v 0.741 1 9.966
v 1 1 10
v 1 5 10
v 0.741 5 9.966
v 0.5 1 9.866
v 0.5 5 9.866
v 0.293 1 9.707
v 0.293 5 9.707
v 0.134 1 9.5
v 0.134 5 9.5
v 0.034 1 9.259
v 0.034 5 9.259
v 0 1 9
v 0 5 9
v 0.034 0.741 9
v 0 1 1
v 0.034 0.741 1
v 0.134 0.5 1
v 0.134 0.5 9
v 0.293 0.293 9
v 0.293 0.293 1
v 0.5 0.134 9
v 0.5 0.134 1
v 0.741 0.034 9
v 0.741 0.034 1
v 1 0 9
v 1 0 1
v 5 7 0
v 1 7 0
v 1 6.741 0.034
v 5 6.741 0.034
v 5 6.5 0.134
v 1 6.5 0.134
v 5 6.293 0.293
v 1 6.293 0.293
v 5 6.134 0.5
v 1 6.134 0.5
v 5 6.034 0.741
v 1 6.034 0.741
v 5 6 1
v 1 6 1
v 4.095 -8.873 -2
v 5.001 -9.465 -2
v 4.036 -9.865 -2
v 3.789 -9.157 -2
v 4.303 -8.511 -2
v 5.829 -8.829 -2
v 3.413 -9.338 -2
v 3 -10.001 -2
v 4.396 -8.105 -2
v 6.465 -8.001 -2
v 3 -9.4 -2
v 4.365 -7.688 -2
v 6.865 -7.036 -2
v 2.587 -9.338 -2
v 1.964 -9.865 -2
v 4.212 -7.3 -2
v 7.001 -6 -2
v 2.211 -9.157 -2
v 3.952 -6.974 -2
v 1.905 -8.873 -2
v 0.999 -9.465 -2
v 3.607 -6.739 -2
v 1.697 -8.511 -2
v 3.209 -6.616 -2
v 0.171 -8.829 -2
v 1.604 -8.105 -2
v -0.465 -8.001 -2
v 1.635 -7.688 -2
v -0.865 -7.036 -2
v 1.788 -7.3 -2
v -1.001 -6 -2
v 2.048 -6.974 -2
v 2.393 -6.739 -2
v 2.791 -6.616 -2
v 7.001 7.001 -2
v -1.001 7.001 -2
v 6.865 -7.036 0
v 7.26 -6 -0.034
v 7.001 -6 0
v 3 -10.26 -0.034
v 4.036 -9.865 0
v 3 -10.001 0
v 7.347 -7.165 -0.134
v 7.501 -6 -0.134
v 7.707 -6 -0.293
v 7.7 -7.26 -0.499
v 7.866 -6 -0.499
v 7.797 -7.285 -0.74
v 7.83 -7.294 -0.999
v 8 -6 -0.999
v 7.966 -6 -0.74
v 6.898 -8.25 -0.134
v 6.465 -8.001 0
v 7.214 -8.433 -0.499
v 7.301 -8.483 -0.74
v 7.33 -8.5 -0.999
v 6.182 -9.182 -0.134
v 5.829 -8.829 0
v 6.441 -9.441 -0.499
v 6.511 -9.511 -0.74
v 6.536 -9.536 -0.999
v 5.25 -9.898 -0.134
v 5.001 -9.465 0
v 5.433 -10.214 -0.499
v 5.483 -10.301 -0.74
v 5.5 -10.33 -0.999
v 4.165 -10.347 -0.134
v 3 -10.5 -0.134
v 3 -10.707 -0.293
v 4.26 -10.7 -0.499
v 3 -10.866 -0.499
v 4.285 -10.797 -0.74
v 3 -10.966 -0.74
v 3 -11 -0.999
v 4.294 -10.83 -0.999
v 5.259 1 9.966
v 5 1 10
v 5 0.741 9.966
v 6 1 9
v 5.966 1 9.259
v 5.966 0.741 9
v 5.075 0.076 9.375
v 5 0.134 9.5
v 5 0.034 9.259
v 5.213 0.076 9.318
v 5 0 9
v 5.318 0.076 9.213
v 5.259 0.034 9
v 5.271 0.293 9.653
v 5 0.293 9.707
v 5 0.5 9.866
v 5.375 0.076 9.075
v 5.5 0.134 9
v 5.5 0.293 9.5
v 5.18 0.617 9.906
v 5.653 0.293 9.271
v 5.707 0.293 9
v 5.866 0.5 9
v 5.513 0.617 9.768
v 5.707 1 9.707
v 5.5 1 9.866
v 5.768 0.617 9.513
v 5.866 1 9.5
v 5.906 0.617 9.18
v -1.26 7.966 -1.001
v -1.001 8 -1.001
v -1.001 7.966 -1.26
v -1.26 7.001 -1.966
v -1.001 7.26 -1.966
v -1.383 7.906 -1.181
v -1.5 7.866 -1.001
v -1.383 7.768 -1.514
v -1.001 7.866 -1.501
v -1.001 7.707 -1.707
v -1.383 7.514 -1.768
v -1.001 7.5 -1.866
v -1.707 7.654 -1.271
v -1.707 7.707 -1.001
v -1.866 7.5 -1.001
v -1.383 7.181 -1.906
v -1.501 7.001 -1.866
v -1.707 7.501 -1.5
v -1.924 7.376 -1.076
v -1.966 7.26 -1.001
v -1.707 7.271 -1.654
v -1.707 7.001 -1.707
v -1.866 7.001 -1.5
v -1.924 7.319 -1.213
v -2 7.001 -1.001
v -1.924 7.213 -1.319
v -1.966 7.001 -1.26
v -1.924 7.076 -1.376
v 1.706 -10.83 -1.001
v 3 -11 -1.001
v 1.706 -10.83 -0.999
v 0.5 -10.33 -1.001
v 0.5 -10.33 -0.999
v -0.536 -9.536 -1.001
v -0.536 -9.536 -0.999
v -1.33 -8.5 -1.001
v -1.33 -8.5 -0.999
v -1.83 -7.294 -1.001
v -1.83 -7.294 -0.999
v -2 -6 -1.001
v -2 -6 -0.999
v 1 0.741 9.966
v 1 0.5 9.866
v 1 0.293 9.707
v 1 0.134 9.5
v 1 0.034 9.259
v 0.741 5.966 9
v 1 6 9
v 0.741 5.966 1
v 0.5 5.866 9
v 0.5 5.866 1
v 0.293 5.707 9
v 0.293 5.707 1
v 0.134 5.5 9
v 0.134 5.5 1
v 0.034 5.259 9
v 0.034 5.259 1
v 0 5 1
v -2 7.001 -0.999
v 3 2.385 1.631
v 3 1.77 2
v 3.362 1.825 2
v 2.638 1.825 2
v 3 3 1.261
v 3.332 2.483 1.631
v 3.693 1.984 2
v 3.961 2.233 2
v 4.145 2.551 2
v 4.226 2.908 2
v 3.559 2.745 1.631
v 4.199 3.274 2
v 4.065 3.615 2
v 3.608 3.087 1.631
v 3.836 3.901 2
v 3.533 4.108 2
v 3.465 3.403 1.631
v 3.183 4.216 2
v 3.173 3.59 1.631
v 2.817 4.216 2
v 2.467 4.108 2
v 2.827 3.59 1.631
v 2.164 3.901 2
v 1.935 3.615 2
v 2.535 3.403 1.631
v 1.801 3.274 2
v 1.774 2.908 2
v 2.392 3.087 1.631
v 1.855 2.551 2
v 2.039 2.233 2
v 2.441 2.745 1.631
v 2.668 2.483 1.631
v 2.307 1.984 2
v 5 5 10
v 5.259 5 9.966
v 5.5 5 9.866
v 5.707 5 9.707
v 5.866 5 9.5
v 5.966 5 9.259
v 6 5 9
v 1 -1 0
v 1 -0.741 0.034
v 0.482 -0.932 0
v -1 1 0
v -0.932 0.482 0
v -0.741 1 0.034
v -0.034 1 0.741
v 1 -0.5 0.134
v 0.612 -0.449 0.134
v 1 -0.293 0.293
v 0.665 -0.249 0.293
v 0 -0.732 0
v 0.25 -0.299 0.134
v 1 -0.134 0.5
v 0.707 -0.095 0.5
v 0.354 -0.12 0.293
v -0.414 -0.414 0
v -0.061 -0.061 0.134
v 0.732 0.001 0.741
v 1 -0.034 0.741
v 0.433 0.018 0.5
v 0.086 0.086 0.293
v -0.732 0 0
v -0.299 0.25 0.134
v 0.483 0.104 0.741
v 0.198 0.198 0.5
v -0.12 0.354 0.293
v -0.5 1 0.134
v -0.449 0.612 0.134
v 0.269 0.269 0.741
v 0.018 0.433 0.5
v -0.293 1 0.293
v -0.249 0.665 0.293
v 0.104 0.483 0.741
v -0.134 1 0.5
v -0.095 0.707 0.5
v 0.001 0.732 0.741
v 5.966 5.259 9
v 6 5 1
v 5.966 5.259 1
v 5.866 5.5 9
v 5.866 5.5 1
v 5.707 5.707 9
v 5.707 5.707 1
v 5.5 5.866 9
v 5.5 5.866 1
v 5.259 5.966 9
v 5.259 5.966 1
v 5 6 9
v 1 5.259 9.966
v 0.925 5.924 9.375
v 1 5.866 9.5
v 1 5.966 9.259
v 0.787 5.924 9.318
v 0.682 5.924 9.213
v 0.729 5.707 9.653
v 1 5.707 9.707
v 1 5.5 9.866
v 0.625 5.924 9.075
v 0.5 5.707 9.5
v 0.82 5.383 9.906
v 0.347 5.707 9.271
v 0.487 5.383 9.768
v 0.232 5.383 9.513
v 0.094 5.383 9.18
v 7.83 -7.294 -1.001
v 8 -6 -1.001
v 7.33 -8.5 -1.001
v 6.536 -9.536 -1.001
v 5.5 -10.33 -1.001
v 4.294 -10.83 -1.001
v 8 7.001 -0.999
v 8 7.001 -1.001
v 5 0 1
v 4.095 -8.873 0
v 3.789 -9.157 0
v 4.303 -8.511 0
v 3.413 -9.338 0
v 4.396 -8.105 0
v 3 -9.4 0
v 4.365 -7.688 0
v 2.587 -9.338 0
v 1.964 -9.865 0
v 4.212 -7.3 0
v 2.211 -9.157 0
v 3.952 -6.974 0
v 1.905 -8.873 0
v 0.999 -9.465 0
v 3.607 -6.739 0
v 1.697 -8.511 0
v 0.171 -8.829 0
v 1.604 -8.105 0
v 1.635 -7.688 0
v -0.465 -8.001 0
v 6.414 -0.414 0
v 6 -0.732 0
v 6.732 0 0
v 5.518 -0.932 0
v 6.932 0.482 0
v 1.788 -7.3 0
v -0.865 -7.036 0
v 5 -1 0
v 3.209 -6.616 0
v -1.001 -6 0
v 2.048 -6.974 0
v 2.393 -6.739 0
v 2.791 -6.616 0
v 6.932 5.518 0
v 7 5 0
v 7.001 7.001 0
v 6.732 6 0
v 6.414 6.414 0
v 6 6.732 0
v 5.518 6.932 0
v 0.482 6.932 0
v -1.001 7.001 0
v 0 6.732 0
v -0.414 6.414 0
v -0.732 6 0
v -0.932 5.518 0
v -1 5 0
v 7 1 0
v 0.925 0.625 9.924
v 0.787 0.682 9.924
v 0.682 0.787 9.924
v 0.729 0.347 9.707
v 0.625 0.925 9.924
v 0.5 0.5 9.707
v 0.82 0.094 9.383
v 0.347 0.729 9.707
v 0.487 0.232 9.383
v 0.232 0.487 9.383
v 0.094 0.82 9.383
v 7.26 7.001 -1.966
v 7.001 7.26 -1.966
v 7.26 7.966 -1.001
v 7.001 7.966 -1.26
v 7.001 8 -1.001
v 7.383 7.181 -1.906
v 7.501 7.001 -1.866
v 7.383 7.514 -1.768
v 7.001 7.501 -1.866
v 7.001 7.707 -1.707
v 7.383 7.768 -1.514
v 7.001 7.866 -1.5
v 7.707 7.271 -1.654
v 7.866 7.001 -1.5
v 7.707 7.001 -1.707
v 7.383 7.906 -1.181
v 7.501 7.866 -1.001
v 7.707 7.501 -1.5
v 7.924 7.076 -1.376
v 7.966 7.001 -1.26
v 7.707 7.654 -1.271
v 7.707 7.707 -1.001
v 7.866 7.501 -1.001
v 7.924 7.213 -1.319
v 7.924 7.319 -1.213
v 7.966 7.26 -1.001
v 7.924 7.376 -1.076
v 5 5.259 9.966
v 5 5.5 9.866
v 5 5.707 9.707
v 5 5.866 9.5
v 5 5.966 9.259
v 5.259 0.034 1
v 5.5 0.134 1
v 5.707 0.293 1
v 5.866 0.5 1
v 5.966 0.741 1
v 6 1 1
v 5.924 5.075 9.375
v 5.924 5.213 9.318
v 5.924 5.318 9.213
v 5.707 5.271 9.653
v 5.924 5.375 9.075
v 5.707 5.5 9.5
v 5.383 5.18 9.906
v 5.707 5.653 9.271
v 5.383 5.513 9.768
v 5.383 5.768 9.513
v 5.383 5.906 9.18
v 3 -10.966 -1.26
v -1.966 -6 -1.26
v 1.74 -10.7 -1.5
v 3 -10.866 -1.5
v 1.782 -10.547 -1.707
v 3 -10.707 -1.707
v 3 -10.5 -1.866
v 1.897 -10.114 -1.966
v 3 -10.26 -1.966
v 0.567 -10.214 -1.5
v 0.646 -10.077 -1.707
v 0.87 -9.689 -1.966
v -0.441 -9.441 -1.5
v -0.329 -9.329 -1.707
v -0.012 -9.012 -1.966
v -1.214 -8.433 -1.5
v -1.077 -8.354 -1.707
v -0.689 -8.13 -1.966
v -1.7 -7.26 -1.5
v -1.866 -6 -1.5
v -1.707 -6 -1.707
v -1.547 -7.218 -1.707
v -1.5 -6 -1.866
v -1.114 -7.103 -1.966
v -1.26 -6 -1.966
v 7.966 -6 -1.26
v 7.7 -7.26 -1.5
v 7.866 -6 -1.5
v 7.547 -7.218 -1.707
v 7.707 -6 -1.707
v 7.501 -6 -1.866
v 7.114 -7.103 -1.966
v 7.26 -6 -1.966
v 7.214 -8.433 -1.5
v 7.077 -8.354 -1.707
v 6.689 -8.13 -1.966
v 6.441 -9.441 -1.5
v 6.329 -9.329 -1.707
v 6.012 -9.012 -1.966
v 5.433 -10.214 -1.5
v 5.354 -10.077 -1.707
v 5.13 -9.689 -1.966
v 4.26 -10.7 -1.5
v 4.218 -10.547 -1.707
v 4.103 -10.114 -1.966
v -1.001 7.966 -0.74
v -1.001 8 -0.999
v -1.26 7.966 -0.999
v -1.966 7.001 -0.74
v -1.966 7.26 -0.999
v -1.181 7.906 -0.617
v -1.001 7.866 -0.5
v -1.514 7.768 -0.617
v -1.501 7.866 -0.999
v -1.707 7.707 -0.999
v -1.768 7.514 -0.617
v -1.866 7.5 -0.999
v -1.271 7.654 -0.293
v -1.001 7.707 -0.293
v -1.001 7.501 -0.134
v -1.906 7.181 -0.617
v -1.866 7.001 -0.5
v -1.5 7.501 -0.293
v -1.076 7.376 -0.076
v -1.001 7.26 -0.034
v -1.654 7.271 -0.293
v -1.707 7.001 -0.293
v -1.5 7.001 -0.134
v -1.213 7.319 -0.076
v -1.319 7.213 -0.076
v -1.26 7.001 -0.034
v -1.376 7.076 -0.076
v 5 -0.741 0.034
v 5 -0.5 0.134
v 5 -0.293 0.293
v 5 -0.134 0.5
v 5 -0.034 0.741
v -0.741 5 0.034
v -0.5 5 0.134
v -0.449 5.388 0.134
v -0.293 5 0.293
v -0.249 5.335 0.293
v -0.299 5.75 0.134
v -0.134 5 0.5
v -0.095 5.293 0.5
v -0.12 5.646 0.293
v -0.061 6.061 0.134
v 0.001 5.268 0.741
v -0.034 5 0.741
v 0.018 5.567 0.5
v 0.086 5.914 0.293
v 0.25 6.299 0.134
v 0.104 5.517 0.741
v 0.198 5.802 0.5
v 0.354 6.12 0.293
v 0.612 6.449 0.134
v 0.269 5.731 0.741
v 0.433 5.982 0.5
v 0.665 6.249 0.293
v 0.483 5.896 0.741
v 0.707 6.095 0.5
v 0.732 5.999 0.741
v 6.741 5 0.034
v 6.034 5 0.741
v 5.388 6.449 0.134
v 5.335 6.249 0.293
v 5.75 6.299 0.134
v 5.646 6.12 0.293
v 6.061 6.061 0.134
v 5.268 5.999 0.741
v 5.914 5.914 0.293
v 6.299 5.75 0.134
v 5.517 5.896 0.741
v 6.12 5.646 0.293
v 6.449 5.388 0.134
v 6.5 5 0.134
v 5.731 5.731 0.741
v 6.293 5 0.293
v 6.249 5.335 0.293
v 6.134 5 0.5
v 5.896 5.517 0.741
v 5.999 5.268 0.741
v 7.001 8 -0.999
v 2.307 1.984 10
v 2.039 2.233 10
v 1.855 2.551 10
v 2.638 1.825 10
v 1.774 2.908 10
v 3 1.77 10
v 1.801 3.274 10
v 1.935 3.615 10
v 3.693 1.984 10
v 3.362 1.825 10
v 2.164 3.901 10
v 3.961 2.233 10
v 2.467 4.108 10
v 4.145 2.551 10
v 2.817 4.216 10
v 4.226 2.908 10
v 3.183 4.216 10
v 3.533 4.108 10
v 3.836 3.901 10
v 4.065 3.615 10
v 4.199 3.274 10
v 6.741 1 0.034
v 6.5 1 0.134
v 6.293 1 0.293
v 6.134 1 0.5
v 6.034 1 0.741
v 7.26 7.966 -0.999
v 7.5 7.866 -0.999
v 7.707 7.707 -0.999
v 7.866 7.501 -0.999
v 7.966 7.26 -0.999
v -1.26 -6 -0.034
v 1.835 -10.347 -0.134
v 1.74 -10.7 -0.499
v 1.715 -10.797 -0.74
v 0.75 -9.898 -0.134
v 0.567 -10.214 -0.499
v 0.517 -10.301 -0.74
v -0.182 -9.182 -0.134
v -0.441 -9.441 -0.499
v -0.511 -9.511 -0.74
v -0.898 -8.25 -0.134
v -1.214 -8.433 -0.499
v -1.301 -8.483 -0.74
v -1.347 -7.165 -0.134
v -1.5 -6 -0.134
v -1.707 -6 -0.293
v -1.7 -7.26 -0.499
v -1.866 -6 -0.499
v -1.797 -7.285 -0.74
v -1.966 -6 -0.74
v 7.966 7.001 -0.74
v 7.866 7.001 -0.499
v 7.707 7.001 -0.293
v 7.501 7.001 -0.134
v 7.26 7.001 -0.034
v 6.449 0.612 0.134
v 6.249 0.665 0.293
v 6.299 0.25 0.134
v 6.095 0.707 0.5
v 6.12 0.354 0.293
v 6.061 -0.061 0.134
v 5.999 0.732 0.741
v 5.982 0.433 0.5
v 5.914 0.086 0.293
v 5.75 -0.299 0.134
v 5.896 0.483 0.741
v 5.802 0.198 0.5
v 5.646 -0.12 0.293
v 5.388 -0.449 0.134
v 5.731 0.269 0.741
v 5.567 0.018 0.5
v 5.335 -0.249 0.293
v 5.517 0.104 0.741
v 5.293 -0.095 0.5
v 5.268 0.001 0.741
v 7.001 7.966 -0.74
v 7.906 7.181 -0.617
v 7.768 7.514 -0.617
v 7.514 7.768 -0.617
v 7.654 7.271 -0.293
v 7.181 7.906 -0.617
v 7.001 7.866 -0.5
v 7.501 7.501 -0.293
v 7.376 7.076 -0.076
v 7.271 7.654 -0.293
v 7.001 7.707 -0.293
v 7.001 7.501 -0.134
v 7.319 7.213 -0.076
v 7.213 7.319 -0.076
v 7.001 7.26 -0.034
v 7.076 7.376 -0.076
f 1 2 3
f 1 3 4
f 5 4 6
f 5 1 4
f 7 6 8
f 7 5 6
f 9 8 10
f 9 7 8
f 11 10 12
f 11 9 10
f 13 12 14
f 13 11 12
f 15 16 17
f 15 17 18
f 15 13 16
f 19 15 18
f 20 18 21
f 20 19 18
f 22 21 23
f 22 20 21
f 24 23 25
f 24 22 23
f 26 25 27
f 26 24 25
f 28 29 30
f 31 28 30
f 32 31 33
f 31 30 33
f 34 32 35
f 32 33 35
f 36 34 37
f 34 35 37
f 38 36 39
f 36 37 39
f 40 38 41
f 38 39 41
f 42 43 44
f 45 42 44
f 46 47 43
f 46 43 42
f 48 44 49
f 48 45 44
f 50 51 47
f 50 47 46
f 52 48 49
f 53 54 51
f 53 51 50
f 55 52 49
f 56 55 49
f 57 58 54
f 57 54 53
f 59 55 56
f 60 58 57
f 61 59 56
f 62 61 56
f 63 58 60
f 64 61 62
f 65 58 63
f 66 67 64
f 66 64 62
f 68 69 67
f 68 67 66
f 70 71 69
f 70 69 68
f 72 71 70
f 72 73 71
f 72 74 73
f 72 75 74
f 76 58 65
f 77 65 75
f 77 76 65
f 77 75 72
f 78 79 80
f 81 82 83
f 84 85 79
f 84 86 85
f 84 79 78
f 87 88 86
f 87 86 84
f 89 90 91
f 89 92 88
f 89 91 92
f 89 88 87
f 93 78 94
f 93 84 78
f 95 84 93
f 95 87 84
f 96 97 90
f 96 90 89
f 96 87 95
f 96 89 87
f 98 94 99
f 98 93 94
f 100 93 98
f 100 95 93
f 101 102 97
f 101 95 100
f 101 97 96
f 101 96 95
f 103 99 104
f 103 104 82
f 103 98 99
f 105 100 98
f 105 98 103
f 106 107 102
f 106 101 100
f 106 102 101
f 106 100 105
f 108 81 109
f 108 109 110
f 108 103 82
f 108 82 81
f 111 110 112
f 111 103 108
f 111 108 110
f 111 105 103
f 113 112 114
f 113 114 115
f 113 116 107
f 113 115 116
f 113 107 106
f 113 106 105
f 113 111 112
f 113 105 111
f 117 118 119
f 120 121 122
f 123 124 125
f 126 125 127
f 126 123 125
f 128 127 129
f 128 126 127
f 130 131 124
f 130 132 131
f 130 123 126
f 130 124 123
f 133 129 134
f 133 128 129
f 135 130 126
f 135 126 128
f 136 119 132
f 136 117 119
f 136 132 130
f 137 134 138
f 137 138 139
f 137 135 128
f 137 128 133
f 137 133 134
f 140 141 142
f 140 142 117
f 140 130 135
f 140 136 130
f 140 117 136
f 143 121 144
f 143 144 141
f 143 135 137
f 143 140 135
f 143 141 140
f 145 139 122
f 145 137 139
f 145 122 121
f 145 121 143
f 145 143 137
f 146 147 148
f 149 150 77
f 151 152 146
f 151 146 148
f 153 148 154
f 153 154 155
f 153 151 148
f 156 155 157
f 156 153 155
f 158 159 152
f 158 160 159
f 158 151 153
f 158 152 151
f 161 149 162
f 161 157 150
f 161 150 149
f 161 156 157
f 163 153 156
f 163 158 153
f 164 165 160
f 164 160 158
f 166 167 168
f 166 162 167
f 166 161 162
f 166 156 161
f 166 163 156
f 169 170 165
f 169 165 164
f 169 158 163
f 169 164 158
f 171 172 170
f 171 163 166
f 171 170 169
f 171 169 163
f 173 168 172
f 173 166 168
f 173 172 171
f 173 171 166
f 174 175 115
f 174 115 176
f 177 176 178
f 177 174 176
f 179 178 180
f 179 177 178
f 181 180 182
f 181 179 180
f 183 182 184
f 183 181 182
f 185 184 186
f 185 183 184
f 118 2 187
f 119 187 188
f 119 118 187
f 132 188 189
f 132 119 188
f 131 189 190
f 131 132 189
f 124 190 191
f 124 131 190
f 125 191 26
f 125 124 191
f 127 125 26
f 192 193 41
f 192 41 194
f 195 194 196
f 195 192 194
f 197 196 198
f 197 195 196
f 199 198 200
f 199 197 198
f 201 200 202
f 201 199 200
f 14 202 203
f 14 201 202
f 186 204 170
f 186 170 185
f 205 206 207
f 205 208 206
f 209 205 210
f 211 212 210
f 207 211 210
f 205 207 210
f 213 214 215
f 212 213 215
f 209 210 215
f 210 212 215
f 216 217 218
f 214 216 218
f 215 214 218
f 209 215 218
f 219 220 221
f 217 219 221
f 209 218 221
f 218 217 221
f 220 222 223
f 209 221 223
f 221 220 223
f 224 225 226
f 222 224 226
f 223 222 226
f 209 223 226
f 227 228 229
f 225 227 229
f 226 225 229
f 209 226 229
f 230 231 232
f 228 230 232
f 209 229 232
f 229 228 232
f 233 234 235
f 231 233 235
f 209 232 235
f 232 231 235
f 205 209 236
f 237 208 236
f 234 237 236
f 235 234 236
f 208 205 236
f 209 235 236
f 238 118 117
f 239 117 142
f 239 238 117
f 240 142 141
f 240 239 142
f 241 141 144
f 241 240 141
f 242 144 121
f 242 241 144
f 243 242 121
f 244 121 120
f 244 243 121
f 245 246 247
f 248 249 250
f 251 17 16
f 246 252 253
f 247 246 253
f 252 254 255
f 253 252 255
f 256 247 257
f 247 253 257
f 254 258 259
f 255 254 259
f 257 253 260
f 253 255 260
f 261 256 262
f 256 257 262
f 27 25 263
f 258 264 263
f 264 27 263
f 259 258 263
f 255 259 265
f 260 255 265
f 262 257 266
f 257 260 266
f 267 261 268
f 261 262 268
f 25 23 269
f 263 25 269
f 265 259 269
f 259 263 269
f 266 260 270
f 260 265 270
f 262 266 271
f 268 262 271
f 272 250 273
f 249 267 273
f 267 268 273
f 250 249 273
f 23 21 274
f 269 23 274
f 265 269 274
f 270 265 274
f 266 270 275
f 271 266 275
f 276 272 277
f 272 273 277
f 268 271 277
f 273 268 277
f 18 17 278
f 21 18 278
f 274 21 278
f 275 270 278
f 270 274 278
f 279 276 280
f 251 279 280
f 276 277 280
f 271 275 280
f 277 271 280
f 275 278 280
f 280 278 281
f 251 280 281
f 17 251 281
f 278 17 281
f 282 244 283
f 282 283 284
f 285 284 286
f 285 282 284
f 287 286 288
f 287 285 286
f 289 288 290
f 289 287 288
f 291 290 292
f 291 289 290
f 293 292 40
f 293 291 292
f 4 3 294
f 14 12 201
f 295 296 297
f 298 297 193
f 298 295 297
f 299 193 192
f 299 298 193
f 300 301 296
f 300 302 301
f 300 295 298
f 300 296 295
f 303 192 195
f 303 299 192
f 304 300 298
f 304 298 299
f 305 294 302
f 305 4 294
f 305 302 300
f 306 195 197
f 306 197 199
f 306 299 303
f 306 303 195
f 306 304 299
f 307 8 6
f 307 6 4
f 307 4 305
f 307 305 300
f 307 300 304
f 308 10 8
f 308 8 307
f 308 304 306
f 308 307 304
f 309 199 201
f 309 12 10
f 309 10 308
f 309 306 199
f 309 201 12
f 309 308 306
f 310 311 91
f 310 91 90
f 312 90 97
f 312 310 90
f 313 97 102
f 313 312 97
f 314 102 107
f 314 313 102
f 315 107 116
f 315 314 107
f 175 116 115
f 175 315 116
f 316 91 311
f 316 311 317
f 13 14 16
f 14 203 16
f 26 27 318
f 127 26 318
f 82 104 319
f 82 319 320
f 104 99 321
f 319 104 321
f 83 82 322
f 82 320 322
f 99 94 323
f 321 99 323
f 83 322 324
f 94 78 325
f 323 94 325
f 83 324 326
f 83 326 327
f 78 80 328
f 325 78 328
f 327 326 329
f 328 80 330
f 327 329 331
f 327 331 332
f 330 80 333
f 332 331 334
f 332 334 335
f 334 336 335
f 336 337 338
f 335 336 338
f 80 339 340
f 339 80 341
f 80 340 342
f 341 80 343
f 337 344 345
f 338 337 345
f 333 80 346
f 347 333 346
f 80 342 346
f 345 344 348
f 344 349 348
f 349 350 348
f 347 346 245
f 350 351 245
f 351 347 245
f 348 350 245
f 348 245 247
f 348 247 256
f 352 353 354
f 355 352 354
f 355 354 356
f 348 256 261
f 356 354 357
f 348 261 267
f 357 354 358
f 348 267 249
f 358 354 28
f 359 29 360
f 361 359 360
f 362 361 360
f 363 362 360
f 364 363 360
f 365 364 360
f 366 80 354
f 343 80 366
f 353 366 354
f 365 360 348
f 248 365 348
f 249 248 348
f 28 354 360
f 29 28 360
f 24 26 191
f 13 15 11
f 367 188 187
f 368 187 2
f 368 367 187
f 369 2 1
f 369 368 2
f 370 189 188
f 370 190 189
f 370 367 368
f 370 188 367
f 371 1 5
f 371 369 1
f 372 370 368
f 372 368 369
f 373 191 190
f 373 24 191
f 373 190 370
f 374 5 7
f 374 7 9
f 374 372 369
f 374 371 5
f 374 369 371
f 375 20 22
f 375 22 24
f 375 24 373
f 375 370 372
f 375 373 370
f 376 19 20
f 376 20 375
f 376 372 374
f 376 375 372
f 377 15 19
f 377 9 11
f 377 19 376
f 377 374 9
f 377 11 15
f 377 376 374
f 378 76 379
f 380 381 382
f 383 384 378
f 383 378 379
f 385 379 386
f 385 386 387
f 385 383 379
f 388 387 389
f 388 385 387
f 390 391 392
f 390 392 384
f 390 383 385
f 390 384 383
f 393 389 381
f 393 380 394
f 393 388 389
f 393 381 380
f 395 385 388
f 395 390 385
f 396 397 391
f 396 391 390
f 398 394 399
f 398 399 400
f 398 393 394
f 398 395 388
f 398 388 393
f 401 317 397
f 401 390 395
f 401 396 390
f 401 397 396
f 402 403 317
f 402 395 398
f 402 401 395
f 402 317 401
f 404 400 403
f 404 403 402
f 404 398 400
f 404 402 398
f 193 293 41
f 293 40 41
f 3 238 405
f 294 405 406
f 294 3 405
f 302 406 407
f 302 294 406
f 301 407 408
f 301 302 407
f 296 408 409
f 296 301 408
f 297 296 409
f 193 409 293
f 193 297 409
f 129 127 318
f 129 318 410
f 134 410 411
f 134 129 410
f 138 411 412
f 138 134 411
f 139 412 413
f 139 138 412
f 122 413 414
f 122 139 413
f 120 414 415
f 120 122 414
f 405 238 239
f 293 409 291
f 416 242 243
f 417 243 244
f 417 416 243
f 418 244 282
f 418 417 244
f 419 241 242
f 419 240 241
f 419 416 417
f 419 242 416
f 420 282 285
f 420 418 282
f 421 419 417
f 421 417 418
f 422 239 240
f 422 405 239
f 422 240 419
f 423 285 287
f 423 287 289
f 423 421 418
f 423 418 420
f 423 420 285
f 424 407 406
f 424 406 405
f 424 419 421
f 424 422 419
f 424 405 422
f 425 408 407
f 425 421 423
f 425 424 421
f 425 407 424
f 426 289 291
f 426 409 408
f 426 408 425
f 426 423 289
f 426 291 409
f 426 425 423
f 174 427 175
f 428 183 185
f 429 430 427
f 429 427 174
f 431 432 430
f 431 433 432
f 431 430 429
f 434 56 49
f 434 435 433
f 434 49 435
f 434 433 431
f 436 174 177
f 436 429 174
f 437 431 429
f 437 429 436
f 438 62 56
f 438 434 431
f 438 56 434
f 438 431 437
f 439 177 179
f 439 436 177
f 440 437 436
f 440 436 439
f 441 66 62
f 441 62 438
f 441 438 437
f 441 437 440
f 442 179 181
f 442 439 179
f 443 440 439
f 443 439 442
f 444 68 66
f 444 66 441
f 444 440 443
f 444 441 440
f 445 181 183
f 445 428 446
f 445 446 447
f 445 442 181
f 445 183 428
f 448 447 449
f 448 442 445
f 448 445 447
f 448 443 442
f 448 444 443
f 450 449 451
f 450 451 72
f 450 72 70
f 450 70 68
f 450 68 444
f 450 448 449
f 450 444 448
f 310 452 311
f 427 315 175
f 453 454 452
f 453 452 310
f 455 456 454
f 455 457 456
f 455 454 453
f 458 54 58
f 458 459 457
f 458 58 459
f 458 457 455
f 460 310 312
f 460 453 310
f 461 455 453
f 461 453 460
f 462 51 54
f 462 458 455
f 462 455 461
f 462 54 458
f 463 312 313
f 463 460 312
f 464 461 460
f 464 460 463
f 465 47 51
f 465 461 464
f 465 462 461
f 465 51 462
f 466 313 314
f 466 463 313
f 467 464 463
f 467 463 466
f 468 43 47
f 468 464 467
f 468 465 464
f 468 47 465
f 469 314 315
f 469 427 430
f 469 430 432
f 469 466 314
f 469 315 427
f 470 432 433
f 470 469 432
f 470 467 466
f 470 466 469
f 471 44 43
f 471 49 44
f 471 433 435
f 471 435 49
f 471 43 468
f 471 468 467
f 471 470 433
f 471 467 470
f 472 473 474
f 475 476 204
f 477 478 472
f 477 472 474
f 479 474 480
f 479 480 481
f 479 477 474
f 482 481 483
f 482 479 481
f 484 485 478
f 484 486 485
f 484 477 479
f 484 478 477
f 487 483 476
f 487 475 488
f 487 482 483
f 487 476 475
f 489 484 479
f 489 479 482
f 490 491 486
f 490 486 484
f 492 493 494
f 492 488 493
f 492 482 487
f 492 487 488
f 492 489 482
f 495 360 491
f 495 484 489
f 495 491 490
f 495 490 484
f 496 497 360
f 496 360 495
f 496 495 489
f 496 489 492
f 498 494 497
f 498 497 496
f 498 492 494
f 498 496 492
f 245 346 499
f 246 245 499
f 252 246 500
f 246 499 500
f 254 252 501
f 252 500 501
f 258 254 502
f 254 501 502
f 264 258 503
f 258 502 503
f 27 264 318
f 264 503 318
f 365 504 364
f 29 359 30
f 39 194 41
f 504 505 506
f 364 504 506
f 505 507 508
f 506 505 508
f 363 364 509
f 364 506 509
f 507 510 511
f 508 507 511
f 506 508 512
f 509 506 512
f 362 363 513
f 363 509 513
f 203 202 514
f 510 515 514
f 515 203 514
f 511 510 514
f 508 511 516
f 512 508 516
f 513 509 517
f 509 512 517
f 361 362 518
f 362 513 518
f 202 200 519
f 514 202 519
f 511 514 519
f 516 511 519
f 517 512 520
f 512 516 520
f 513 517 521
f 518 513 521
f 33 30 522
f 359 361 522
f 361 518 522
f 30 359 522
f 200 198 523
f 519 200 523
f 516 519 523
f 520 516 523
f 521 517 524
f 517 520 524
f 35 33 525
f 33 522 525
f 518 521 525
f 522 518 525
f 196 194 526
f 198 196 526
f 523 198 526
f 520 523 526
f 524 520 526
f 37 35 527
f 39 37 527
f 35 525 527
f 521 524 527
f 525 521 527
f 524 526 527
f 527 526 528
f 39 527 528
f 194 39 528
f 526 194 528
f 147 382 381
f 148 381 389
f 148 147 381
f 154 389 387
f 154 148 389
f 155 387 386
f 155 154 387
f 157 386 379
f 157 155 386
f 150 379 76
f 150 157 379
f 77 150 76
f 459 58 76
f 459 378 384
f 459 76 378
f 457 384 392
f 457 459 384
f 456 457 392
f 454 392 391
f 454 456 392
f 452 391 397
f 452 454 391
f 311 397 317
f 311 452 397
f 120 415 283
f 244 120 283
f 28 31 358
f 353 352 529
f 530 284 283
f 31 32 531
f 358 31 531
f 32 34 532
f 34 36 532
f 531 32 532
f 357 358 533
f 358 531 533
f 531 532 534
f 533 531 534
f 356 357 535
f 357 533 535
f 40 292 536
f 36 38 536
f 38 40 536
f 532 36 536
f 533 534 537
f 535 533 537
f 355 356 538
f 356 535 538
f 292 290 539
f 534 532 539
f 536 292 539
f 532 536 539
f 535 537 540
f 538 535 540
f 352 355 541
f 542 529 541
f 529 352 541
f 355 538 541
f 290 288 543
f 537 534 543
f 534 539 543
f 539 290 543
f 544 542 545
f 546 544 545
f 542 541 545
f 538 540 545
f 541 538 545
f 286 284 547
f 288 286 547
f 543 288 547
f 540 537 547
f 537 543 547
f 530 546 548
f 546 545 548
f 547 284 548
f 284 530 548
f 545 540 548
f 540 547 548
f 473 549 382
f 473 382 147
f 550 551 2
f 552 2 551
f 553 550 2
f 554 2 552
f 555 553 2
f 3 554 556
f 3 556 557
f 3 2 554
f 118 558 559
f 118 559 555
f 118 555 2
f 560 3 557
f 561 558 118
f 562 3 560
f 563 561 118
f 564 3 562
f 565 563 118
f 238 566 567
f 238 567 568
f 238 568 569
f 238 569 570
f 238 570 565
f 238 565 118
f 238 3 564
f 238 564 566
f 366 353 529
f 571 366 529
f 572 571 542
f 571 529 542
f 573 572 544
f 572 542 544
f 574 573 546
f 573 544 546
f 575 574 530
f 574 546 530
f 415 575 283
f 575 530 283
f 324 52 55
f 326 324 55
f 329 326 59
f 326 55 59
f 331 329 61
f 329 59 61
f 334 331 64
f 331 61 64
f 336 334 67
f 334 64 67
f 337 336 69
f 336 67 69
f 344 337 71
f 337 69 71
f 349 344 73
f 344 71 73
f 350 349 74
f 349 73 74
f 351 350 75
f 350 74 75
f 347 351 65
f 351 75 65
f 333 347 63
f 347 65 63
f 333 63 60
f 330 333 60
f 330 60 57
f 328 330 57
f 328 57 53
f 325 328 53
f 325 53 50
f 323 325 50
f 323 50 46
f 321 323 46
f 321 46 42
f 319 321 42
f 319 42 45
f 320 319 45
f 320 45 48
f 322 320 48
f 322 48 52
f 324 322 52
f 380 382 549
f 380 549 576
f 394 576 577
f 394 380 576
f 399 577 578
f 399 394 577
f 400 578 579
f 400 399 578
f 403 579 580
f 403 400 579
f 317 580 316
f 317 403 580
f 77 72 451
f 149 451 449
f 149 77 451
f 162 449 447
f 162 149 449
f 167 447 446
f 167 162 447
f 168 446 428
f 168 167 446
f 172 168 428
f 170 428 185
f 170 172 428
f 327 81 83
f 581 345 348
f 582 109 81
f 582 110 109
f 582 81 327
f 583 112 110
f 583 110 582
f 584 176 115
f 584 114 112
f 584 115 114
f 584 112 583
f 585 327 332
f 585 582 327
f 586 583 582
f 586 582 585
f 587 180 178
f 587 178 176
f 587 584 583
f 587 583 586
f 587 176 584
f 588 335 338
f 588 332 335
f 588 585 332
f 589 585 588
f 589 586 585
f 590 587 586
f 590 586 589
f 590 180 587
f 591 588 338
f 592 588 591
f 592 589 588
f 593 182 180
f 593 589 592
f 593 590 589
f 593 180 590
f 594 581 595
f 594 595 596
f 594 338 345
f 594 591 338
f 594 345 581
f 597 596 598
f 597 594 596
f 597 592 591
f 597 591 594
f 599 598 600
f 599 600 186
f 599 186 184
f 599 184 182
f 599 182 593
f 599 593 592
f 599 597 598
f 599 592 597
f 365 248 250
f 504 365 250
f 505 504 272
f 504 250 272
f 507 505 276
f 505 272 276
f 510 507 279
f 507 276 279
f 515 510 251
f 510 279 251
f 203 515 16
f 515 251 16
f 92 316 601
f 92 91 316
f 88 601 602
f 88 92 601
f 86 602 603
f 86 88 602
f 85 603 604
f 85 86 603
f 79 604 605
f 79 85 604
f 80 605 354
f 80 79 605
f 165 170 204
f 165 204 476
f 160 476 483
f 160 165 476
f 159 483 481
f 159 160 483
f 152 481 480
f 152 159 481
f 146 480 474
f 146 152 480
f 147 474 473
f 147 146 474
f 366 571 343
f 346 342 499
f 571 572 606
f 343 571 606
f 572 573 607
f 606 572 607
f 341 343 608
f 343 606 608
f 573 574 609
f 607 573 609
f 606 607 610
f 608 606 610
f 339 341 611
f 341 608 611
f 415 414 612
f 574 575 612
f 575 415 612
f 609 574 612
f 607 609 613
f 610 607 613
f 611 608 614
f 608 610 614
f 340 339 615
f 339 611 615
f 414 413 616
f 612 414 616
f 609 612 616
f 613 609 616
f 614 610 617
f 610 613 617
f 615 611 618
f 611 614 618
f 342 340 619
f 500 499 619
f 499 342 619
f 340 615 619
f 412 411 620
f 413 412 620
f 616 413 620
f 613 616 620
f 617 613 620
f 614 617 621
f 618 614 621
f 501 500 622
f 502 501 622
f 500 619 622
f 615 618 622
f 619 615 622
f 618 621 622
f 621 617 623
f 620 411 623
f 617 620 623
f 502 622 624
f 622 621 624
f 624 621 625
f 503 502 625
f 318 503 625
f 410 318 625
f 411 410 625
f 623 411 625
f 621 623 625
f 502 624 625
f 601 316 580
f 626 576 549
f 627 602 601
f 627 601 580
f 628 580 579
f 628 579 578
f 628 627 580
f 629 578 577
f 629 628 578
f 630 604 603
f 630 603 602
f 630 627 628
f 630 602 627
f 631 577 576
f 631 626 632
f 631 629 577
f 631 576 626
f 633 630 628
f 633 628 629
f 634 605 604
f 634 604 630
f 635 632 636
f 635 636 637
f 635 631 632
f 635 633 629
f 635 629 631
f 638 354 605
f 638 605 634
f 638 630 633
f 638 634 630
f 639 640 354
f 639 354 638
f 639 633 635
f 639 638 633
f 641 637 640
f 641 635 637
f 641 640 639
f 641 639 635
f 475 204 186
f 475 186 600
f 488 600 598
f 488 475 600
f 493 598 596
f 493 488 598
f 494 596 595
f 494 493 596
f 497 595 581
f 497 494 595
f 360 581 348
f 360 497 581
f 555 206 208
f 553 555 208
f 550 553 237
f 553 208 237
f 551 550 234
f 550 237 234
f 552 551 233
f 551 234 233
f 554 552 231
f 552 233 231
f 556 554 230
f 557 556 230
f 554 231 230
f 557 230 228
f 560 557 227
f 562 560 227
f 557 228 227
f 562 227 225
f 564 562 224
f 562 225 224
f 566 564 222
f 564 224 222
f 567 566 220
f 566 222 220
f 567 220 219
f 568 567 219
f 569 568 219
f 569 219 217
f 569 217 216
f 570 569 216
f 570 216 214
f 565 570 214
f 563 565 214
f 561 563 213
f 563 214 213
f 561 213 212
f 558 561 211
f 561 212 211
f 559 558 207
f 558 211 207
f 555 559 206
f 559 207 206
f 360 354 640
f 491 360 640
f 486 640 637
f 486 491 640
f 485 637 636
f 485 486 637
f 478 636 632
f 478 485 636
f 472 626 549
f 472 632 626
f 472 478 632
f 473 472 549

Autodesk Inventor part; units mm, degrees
ref_plane "YZ Plane" through (0, 0, 0) normal (1, 0, 0) x (0, 1, 0)
ref_plane "XZ Plane" through (0, 0, 0) normal (0, 1, 0) x (-1, 0, 0)
ref_plane "XY Plane" through (0, 0, 0) normal (0, 0, 1) x (1, 0, 0)
sketch "Sketch1" plane through (0, 0, 0) normal (0, 0, 1) x (1, 0, 0)
  line L0 (0, 0) -> (6, 0)
  line L1 (6, 0) -> (6, 6)
  line L2 (6, 6) -> (0, 6)
  line L3 (0, 6) -> (0, 0)
  dimension "d0" = 6
  dimension "d1" = 6
extrude "Extrusion1" add sketch "Sketch1" along normal blind 10
sketch "Sketch8" plane through (0, 0, 0) normal (0, 0, -1) x (-1, 0, 0)
  line L0 (0, 0) -> (-6, 0) projected
  line L1 (0, 6) -> (0, 0) projected
  line L2 (-6, 6) -> (0, 6) projected
  line L3 (-6, 0) -> (-6, 6) projected
  line L4 (-8, 8) -> (2, 8)
  line L5 (2, 8) -> (2, -11)
  line L6 (2, -11) -> (-8, -11)
  line L7 (-8, -11) -> (-8, 8)
  dimension "d46" = 2
  dimension "d47" = 2
  dimension "d48" = 2
  dimension "d49" = 11
extrude "Extrusion4" add sketch "Sketch8" along normal blind 2 contours L0 L3 L2 L1 | L4 L5 L6 L7
sketch "Sketch9" plane through (0, 0, 10) normal (0, 0, 1) x (1, 0, 0)
  line L0 (0, 6) -> (6, 0) construction
  line L1 (0, 0) -> (6, 6) construction
  point P0 (3, 3)
hole "Hole5" at (3, 3, 10) direction (0, 0, -1) diameter 2.459 depth 8 tip angle 118 thread size "M3x0.5" class "6H" standard "ISO Metric profile"
sketch "Sketch10" plane through (0, 0, 0) normal (0, 0, 1) x (1, 0, 0)
  line L0 (8, 8) -> (-2, 8) projected
  line L1 (-2, -11) -> (8, -11) projected
  line L2 (3, -11) -> (3, 8) construction
  point P0 (3, -8)
  dimension "d59" = 3
hole "Hole6" at (3, -8, 0) direction (0, 0, -1) diameter 2.8 end through all
fillet "Fillet4" radius 5 2 edges at (8, -11, -1) (-2, -11, -1)
fillet "Fillet5" radius 1 8 edges at (0, 0, 5) (0, 3, 10) (0, 6, 5) (3, 6, 10) (6, 6, 5) (6, 3, 10) (6, 0, 5) (3, 0, 10)
fillet "Fillet6" radius 1 8 edges at (3, 6, 0) (0.2929, 5.7071, 0) (0, 3, 0) (0.2929, 0.2929, 0) (3, 0, 0) (5.7071, 0.2929, 0) (6, 3, 0) (5.7071, 5.7071, 0)
fillet "Fillet8" radius 0.999 4 edges at (8, 8, -1) (-2, 8, -1) (3, 8, 0) (3, 8, -2)
fillet "Fillet9" radius 0.999 10 edges at (7.7074, 7.7074, -0.2926) (-0.5356, -9.5356, 0) (-2, 0.5005, 0) (-1.7074, 7.7074, -0.2926) (8, 0.5005, 0) (-0.5356, -9.5356, -2) (-2, 0.5005, -2) (-1.7074, 7.7074, -1.7074) (7.7074, 7.7074, -1.7074) (8, 0.5005, -2)
properties part number "termination_lv_conductor" material "Copper, Cast"
